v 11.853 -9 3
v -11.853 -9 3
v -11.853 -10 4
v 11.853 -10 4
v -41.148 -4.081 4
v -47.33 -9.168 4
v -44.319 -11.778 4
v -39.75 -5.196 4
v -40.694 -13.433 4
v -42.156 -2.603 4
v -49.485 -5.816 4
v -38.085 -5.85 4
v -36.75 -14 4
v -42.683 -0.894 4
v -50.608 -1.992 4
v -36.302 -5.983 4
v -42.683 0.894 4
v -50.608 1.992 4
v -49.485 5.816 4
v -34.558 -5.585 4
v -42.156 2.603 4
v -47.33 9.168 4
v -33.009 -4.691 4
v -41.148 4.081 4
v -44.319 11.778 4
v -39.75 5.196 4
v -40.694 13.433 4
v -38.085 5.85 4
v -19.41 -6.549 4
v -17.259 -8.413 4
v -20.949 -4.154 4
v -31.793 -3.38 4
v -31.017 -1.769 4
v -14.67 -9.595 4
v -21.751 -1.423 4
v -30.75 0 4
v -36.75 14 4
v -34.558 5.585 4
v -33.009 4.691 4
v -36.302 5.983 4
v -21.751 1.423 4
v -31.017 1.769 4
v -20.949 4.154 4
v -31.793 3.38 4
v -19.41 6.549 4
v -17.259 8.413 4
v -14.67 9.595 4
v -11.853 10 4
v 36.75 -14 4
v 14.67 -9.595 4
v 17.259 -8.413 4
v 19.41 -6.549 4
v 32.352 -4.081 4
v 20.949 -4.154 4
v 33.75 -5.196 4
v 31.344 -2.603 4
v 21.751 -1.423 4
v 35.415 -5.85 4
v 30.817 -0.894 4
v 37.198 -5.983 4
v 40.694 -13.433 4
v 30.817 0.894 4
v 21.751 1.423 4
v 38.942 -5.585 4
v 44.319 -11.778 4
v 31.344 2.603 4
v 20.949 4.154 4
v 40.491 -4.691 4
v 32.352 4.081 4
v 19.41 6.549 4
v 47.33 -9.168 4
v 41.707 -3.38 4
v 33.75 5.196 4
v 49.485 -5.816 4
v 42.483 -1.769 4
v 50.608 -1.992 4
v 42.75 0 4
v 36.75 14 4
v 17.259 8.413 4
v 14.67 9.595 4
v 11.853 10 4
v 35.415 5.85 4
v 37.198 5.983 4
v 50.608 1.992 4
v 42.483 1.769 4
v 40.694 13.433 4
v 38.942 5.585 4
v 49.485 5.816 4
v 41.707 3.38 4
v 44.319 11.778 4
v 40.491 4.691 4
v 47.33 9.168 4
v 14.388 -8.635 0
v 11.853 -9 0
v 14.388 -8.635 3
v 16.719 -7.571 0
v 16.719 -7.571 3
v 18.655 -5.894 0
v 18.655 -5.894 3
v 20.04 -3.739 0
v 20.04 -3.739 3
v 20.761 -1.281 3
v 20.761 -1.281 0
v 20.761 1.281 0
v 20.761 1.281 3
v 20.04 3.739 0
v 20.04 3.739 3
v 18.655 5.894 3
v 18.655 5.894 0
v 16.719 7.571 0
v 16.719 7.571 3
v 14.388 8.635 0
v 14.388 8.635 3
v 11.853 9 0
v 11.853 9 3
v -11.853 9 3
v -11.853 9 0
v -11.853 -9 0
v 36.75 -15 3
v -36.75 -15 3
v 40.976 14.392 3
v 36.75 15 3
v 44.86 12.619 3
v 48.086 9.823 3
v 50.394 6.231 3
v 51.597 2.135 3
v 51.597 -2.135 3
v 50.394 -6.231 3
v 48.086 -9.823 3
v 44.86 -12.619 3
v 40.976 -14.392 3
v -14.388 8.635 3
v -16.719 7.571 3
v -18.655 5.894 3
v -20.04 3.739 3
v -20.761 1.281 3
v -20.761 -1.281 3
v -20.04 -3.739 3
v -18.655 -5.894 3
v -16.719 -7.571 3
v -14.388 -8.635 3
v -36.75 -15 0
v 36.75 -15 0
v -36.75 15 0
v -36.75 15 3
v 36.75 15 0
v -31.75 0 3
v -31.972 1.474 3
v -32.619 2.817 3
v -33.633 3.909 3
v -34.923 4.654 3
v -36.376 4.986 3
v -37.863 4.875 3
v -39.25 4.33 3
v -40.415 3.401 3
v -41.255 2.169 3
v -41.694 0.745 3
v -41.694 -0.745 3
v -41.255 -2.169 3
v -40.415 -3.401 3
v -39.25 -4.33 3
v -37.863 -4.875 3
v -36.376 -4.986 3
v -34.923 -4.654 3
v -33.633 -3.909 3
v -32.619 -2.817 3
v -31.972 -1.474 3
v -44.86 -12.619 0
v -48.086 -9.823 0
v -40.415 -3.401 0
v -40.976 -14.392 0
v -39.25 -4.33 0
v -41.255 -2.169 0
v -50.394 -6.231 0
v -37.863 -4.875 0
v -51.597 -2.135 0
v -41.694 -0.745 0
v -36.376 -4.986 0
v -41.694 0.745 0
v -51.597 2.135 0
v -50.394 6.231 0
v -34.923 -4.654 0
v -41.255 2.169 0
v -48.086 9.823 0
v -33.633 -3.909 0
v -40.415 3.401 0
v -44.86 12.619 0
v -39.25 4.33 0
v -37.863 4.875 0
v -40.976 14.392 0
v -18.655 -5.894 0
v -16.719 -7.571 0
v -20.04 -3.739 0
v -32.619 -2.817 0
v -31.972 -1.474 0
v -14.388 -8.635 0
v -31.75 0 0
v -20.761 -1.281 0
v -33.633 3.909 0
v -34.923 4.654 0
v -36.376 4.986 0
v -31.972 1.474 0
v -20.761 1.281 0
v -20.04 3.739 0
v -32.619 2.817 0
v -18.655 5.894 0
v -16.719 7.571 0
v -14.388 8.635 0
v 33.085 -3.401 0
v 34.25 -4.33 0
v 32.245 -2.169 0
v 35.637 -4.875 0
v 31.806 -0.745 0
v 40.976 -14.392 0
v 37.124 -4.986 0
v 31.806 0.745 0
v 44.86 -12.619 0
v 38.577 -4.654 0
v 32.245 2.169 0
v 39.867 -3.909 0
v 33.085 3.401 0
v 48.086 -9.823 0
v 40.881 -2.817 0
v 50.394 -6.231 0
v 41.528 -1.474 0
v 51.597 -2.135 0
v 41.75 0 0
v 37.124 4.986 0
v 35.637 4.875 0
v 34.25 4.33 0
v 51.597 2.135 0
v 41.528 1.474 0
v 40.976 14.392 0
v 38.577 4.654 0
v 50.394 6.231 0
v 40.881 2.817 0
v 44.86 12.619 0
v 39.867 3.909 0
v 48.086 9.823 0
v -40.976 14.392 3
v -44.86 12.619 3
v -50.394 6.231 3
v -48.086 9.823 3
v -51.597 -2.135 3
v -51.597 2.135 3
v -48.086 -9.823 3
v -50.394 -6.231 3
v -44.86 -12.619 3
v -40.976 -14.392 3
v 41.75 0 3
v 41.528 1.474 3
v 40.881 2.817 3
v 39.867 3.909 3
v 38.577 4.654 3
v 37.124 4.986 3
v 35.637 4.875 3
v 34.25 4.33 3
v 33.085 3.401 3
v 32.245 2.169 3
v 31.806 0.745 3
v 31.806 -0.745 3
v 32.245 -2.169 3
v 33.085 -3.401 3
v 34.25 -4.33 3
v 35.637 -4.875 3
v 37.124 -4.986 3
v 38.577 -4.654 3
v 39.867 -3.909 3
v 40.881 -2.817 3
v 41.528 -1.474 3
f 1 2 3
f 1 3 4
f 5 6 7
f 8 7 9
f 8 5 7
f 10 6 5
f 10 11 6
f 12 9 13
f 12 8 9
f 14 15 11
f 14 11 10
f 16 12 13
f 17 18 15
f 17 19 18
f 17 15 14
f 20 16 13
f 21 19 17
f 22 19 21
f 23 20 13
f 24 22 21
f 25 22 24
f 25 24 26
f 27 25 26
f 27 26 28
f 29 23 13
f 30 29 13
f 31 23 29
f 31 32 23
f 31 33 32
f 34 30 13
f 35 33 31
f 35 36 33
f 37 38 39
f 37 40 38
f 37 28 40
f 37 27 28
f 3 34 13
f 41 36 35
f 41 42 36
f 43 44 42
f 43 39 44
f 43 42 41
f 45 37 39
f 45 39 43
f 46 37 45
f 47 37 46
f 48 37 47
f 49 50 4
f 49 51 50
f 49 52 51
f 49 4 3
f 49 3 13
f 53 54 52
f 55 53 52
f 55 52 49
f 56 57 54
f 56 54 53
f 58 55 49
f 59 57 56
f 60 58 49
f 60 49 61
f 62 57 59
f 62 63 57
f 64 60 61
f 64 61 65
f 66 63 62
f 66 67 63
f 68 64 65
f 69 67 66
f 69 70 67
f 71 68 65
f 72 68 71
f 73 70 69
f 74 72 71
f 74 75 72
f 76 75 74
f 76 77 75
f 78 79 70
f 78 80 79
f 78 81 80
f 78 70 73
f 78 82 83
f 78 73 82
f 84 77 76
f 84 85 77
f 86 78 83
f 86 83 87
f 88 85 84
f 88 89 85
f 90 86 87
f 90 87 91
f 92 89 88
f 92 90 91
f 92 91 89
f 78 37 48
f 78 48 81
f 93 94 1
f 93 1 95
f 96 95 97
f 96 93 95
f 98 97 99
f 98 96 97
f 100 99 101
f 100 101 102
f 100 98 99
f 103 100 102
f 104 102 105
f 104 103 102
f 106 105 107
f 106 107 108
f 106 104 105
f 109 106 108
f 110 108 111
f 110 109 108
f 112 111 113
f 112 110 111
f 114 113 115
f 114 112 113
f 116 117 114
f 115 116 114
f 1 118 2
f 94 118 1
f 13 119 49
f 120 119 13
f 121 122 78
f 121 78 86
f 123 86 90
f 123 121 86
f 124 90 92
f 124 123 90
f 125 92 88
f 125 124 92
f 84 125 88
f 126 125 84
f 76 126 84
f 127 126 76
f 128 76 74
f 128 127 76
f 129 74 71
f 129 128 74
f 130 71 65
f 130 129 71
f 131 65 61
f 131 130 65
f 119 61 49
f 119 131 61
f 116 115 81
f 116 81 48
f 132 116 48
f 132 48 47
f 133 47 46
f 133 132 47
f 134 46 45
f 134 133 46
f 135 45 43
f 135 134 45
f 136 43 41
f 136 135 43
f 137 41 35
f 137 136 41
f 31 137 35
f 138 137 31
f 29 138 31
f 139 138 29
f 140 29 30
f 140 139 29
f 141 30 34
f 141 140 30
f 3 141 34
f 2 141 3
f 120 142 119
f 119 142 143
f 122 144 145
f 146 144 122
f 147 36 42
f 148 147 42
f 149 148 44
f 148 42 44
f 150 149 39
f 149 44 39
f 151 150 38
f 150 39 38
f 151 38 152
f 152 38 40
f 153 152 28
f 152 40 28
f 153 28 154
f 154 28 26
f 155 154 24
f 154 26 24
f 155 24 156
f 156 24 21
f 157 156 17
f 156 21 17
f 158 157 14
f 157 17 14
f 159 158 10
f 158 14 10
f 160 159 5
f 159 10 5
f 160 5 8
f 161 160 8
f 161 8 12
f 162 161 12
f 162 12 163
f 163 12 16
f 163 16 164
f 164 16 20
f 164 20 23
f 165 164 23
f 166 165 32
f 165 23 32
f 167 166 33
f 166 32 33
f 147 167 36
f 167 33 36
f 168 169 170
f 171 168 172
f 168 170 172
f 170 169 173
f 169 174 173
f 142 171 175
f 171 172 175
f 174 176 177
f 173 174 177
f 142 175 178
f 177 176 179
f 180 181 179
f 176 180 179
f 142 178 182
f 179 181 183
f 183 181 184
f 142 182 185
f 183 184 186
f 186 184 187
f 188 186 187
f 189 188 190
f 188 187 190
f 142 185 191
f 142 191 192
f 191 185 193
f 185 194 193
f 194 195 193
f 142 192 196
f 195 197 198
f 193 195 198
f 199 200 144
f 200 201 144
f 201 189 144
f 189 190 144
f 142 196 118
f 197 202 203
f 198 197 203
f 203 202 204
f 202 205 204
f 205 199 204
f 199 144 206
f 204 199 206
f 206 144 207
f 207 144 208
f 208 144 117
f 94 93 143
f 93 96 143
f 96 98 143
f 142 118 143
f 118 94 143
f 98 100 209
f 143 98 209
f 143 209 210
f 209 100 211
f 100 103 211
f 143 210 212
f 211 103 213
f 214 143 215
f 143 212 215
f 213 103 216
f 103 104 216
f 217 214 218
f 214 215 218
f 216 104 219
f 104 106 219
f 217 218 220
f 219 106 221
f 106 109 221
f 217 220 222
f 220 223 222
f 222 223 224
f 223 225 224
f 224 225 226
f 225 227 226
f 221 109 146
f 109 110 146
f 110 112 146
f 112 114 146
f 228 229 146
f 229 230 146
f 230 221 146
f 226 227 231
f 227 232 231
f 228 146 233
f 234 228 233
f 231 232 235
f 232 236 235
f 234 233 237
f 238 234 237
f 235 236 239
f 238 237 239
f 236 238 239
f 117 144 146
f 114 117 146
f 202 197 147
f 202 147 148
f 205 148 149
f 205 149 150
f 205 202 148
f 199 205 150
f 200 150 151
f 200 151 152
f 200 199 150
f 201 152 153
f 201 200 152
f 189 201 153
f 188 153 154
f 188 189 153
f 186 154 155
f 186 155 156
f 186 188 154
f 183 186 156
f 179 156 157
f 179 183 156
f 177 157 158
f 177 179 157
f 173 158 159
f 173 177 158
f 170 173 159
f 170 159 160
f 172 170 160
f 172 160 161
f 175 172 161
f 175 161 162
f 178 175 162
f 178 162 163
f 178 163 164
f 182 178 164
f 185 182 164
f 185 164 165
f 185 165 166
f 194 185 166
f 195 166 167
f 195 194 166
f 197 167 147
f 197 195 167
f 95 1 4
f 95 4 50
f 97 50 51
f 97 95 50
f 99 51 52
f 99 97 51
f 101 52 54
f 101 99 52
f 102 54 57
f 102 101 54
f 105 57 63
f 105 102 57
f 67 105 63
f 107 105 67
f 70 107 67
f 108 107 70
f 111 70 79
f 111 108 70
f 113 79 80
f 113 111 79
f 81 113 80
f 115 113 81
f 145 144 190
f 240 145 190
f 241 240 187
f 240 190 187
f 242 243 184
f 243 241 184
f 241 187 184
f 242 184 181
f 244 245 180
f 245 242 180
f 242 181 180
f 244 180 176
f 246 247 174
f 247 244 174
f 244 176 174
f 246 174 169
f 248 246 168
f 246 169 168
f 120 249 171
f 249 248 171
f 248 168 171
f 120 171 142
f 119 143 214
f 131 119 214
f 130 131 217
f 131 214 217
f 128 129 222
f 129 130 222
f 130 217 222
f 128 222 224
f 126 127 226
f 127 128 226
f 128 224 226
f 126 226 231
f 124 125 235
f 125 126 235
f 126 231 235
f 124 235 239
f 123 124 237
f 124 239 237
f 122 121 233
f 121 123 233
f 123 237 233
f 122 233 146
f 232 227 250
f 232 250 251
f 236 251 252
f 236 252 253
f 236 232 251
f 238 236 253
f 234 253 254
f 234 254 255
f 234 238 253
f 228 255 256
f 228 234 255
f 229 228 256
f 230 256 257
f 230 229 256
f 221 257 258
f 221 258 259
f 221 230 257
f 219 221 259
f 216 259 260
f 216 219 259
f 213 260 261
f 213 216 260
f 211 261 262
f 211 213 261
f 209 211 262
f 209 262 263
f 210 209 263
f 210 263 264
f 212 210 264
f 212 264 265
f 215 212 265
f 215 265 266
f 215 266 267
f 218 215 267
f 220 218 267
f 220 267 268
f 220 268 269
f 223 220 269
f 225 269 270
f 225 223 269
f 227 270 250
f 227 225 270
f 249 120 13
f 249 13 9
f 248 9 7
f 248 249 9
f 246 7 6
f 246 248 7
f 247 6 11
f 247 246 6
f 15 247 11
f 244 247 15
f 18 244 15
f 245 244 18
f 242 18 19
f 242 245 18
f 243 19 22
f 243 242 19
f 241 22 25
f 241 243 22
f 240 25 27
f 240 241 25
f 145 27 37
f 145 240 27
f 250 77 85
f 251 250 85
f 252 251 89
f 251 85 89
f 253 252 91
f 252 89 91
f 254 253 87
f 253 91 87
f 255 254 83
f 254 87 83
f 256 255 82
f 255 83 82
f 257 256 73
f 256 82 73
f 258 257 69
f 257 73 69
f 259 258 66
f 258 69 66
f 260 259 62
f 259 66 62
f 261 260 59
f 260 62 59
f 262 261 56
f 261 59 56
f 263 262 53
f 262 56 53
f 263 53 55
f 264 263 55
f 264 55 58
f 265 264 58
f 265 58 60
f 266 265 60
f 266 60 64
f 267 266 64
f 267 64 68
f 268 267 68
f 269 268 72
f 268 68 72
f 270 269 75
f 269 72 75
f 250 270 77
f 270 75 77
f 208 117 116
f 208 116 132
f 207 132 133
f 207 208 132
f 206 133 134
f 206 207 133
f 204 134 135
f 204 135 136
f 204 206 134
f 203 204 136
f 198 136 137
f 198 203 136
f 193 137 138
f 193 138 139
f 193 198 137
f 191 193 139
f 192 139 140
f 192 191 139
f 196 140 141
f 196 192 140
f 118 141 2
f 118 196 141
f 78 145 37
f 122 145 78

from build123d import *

# Parameters (mm, degrees)
SKETCH_R        = 5
PAD_DEPTH       = 4
CHAMFER_SIZE    = 1
CHAMFER001_SIZE = 1
CHAMFER002_SIZE = 1


with BuildPart() as part:
    # Sketch → Pad (new body)
    with BuildSketch(Plane.XY):
        with BuildLine():
            ThreePointArc((-36.75, 15), (-51.75, 0), (-36.75, -15))
            Line((-36.75, -15), (36.75, -15))
            ThreePointArc((36.75, -15), (51.75, 0), (36.75, 15))
            Line((-36.75, 15), (36.75, 15))
        make_face()
        with Locations((-36.75, 0)):
            Circle(SKETCH_R, mode=Mode.SUBTRACT)
        with Locations((36.75, 0)):
            Circle(SKETCH_R, mode=Mode.SUBTRACT)
        with BuildLine():
            ThreePointArc((-11.85289, 9), (-20.85289, 0), (-11.85289, -9))
            Line((-11.85289, -9), (11.85289, -9))
            ThreePointArc((11.85289, -9), (20.85289, 0), (11.85289, 9))
            Line((-11.85289, 9), (11.85289, 9))
        make_face(mode=Mode.SUBTRACT)
    extrude(amount=PAD_DEPTH)

    # Chamfer
    chamfer_edges = [part.edges().sort_by_distance(p)[0] for p in [
        (-41.75, 0, 4),
        (31.75, 0, 4),
    ]]
    chamfer(chamfer_edges, length=CHAMFER_SIZE)

    # Chamfer001
    chamfer001_edges = [part.edges().sort_by_distance(p)[0] for p in [
        (0, 15, 4),
        (51.75, 0, 4),
        (0, -15, 4),
        (-51.75, 0, 4),
    ]]
    chamfer(chamfer001_edges, length=CHAMFER001_SIZE)

    # Chamfer002
    chamfer002_edges = [part.edges().sort_by_distance(p)[0] for p in [
        (20.85289, 0, 4),
        (0, -9, 4),
        (-20.85289, 0, 4),
        (0, 9, 4),
    ]]
    chamfer(chamfer002_edges, length=CHAMFER002_SIZE)


solid = part.part
